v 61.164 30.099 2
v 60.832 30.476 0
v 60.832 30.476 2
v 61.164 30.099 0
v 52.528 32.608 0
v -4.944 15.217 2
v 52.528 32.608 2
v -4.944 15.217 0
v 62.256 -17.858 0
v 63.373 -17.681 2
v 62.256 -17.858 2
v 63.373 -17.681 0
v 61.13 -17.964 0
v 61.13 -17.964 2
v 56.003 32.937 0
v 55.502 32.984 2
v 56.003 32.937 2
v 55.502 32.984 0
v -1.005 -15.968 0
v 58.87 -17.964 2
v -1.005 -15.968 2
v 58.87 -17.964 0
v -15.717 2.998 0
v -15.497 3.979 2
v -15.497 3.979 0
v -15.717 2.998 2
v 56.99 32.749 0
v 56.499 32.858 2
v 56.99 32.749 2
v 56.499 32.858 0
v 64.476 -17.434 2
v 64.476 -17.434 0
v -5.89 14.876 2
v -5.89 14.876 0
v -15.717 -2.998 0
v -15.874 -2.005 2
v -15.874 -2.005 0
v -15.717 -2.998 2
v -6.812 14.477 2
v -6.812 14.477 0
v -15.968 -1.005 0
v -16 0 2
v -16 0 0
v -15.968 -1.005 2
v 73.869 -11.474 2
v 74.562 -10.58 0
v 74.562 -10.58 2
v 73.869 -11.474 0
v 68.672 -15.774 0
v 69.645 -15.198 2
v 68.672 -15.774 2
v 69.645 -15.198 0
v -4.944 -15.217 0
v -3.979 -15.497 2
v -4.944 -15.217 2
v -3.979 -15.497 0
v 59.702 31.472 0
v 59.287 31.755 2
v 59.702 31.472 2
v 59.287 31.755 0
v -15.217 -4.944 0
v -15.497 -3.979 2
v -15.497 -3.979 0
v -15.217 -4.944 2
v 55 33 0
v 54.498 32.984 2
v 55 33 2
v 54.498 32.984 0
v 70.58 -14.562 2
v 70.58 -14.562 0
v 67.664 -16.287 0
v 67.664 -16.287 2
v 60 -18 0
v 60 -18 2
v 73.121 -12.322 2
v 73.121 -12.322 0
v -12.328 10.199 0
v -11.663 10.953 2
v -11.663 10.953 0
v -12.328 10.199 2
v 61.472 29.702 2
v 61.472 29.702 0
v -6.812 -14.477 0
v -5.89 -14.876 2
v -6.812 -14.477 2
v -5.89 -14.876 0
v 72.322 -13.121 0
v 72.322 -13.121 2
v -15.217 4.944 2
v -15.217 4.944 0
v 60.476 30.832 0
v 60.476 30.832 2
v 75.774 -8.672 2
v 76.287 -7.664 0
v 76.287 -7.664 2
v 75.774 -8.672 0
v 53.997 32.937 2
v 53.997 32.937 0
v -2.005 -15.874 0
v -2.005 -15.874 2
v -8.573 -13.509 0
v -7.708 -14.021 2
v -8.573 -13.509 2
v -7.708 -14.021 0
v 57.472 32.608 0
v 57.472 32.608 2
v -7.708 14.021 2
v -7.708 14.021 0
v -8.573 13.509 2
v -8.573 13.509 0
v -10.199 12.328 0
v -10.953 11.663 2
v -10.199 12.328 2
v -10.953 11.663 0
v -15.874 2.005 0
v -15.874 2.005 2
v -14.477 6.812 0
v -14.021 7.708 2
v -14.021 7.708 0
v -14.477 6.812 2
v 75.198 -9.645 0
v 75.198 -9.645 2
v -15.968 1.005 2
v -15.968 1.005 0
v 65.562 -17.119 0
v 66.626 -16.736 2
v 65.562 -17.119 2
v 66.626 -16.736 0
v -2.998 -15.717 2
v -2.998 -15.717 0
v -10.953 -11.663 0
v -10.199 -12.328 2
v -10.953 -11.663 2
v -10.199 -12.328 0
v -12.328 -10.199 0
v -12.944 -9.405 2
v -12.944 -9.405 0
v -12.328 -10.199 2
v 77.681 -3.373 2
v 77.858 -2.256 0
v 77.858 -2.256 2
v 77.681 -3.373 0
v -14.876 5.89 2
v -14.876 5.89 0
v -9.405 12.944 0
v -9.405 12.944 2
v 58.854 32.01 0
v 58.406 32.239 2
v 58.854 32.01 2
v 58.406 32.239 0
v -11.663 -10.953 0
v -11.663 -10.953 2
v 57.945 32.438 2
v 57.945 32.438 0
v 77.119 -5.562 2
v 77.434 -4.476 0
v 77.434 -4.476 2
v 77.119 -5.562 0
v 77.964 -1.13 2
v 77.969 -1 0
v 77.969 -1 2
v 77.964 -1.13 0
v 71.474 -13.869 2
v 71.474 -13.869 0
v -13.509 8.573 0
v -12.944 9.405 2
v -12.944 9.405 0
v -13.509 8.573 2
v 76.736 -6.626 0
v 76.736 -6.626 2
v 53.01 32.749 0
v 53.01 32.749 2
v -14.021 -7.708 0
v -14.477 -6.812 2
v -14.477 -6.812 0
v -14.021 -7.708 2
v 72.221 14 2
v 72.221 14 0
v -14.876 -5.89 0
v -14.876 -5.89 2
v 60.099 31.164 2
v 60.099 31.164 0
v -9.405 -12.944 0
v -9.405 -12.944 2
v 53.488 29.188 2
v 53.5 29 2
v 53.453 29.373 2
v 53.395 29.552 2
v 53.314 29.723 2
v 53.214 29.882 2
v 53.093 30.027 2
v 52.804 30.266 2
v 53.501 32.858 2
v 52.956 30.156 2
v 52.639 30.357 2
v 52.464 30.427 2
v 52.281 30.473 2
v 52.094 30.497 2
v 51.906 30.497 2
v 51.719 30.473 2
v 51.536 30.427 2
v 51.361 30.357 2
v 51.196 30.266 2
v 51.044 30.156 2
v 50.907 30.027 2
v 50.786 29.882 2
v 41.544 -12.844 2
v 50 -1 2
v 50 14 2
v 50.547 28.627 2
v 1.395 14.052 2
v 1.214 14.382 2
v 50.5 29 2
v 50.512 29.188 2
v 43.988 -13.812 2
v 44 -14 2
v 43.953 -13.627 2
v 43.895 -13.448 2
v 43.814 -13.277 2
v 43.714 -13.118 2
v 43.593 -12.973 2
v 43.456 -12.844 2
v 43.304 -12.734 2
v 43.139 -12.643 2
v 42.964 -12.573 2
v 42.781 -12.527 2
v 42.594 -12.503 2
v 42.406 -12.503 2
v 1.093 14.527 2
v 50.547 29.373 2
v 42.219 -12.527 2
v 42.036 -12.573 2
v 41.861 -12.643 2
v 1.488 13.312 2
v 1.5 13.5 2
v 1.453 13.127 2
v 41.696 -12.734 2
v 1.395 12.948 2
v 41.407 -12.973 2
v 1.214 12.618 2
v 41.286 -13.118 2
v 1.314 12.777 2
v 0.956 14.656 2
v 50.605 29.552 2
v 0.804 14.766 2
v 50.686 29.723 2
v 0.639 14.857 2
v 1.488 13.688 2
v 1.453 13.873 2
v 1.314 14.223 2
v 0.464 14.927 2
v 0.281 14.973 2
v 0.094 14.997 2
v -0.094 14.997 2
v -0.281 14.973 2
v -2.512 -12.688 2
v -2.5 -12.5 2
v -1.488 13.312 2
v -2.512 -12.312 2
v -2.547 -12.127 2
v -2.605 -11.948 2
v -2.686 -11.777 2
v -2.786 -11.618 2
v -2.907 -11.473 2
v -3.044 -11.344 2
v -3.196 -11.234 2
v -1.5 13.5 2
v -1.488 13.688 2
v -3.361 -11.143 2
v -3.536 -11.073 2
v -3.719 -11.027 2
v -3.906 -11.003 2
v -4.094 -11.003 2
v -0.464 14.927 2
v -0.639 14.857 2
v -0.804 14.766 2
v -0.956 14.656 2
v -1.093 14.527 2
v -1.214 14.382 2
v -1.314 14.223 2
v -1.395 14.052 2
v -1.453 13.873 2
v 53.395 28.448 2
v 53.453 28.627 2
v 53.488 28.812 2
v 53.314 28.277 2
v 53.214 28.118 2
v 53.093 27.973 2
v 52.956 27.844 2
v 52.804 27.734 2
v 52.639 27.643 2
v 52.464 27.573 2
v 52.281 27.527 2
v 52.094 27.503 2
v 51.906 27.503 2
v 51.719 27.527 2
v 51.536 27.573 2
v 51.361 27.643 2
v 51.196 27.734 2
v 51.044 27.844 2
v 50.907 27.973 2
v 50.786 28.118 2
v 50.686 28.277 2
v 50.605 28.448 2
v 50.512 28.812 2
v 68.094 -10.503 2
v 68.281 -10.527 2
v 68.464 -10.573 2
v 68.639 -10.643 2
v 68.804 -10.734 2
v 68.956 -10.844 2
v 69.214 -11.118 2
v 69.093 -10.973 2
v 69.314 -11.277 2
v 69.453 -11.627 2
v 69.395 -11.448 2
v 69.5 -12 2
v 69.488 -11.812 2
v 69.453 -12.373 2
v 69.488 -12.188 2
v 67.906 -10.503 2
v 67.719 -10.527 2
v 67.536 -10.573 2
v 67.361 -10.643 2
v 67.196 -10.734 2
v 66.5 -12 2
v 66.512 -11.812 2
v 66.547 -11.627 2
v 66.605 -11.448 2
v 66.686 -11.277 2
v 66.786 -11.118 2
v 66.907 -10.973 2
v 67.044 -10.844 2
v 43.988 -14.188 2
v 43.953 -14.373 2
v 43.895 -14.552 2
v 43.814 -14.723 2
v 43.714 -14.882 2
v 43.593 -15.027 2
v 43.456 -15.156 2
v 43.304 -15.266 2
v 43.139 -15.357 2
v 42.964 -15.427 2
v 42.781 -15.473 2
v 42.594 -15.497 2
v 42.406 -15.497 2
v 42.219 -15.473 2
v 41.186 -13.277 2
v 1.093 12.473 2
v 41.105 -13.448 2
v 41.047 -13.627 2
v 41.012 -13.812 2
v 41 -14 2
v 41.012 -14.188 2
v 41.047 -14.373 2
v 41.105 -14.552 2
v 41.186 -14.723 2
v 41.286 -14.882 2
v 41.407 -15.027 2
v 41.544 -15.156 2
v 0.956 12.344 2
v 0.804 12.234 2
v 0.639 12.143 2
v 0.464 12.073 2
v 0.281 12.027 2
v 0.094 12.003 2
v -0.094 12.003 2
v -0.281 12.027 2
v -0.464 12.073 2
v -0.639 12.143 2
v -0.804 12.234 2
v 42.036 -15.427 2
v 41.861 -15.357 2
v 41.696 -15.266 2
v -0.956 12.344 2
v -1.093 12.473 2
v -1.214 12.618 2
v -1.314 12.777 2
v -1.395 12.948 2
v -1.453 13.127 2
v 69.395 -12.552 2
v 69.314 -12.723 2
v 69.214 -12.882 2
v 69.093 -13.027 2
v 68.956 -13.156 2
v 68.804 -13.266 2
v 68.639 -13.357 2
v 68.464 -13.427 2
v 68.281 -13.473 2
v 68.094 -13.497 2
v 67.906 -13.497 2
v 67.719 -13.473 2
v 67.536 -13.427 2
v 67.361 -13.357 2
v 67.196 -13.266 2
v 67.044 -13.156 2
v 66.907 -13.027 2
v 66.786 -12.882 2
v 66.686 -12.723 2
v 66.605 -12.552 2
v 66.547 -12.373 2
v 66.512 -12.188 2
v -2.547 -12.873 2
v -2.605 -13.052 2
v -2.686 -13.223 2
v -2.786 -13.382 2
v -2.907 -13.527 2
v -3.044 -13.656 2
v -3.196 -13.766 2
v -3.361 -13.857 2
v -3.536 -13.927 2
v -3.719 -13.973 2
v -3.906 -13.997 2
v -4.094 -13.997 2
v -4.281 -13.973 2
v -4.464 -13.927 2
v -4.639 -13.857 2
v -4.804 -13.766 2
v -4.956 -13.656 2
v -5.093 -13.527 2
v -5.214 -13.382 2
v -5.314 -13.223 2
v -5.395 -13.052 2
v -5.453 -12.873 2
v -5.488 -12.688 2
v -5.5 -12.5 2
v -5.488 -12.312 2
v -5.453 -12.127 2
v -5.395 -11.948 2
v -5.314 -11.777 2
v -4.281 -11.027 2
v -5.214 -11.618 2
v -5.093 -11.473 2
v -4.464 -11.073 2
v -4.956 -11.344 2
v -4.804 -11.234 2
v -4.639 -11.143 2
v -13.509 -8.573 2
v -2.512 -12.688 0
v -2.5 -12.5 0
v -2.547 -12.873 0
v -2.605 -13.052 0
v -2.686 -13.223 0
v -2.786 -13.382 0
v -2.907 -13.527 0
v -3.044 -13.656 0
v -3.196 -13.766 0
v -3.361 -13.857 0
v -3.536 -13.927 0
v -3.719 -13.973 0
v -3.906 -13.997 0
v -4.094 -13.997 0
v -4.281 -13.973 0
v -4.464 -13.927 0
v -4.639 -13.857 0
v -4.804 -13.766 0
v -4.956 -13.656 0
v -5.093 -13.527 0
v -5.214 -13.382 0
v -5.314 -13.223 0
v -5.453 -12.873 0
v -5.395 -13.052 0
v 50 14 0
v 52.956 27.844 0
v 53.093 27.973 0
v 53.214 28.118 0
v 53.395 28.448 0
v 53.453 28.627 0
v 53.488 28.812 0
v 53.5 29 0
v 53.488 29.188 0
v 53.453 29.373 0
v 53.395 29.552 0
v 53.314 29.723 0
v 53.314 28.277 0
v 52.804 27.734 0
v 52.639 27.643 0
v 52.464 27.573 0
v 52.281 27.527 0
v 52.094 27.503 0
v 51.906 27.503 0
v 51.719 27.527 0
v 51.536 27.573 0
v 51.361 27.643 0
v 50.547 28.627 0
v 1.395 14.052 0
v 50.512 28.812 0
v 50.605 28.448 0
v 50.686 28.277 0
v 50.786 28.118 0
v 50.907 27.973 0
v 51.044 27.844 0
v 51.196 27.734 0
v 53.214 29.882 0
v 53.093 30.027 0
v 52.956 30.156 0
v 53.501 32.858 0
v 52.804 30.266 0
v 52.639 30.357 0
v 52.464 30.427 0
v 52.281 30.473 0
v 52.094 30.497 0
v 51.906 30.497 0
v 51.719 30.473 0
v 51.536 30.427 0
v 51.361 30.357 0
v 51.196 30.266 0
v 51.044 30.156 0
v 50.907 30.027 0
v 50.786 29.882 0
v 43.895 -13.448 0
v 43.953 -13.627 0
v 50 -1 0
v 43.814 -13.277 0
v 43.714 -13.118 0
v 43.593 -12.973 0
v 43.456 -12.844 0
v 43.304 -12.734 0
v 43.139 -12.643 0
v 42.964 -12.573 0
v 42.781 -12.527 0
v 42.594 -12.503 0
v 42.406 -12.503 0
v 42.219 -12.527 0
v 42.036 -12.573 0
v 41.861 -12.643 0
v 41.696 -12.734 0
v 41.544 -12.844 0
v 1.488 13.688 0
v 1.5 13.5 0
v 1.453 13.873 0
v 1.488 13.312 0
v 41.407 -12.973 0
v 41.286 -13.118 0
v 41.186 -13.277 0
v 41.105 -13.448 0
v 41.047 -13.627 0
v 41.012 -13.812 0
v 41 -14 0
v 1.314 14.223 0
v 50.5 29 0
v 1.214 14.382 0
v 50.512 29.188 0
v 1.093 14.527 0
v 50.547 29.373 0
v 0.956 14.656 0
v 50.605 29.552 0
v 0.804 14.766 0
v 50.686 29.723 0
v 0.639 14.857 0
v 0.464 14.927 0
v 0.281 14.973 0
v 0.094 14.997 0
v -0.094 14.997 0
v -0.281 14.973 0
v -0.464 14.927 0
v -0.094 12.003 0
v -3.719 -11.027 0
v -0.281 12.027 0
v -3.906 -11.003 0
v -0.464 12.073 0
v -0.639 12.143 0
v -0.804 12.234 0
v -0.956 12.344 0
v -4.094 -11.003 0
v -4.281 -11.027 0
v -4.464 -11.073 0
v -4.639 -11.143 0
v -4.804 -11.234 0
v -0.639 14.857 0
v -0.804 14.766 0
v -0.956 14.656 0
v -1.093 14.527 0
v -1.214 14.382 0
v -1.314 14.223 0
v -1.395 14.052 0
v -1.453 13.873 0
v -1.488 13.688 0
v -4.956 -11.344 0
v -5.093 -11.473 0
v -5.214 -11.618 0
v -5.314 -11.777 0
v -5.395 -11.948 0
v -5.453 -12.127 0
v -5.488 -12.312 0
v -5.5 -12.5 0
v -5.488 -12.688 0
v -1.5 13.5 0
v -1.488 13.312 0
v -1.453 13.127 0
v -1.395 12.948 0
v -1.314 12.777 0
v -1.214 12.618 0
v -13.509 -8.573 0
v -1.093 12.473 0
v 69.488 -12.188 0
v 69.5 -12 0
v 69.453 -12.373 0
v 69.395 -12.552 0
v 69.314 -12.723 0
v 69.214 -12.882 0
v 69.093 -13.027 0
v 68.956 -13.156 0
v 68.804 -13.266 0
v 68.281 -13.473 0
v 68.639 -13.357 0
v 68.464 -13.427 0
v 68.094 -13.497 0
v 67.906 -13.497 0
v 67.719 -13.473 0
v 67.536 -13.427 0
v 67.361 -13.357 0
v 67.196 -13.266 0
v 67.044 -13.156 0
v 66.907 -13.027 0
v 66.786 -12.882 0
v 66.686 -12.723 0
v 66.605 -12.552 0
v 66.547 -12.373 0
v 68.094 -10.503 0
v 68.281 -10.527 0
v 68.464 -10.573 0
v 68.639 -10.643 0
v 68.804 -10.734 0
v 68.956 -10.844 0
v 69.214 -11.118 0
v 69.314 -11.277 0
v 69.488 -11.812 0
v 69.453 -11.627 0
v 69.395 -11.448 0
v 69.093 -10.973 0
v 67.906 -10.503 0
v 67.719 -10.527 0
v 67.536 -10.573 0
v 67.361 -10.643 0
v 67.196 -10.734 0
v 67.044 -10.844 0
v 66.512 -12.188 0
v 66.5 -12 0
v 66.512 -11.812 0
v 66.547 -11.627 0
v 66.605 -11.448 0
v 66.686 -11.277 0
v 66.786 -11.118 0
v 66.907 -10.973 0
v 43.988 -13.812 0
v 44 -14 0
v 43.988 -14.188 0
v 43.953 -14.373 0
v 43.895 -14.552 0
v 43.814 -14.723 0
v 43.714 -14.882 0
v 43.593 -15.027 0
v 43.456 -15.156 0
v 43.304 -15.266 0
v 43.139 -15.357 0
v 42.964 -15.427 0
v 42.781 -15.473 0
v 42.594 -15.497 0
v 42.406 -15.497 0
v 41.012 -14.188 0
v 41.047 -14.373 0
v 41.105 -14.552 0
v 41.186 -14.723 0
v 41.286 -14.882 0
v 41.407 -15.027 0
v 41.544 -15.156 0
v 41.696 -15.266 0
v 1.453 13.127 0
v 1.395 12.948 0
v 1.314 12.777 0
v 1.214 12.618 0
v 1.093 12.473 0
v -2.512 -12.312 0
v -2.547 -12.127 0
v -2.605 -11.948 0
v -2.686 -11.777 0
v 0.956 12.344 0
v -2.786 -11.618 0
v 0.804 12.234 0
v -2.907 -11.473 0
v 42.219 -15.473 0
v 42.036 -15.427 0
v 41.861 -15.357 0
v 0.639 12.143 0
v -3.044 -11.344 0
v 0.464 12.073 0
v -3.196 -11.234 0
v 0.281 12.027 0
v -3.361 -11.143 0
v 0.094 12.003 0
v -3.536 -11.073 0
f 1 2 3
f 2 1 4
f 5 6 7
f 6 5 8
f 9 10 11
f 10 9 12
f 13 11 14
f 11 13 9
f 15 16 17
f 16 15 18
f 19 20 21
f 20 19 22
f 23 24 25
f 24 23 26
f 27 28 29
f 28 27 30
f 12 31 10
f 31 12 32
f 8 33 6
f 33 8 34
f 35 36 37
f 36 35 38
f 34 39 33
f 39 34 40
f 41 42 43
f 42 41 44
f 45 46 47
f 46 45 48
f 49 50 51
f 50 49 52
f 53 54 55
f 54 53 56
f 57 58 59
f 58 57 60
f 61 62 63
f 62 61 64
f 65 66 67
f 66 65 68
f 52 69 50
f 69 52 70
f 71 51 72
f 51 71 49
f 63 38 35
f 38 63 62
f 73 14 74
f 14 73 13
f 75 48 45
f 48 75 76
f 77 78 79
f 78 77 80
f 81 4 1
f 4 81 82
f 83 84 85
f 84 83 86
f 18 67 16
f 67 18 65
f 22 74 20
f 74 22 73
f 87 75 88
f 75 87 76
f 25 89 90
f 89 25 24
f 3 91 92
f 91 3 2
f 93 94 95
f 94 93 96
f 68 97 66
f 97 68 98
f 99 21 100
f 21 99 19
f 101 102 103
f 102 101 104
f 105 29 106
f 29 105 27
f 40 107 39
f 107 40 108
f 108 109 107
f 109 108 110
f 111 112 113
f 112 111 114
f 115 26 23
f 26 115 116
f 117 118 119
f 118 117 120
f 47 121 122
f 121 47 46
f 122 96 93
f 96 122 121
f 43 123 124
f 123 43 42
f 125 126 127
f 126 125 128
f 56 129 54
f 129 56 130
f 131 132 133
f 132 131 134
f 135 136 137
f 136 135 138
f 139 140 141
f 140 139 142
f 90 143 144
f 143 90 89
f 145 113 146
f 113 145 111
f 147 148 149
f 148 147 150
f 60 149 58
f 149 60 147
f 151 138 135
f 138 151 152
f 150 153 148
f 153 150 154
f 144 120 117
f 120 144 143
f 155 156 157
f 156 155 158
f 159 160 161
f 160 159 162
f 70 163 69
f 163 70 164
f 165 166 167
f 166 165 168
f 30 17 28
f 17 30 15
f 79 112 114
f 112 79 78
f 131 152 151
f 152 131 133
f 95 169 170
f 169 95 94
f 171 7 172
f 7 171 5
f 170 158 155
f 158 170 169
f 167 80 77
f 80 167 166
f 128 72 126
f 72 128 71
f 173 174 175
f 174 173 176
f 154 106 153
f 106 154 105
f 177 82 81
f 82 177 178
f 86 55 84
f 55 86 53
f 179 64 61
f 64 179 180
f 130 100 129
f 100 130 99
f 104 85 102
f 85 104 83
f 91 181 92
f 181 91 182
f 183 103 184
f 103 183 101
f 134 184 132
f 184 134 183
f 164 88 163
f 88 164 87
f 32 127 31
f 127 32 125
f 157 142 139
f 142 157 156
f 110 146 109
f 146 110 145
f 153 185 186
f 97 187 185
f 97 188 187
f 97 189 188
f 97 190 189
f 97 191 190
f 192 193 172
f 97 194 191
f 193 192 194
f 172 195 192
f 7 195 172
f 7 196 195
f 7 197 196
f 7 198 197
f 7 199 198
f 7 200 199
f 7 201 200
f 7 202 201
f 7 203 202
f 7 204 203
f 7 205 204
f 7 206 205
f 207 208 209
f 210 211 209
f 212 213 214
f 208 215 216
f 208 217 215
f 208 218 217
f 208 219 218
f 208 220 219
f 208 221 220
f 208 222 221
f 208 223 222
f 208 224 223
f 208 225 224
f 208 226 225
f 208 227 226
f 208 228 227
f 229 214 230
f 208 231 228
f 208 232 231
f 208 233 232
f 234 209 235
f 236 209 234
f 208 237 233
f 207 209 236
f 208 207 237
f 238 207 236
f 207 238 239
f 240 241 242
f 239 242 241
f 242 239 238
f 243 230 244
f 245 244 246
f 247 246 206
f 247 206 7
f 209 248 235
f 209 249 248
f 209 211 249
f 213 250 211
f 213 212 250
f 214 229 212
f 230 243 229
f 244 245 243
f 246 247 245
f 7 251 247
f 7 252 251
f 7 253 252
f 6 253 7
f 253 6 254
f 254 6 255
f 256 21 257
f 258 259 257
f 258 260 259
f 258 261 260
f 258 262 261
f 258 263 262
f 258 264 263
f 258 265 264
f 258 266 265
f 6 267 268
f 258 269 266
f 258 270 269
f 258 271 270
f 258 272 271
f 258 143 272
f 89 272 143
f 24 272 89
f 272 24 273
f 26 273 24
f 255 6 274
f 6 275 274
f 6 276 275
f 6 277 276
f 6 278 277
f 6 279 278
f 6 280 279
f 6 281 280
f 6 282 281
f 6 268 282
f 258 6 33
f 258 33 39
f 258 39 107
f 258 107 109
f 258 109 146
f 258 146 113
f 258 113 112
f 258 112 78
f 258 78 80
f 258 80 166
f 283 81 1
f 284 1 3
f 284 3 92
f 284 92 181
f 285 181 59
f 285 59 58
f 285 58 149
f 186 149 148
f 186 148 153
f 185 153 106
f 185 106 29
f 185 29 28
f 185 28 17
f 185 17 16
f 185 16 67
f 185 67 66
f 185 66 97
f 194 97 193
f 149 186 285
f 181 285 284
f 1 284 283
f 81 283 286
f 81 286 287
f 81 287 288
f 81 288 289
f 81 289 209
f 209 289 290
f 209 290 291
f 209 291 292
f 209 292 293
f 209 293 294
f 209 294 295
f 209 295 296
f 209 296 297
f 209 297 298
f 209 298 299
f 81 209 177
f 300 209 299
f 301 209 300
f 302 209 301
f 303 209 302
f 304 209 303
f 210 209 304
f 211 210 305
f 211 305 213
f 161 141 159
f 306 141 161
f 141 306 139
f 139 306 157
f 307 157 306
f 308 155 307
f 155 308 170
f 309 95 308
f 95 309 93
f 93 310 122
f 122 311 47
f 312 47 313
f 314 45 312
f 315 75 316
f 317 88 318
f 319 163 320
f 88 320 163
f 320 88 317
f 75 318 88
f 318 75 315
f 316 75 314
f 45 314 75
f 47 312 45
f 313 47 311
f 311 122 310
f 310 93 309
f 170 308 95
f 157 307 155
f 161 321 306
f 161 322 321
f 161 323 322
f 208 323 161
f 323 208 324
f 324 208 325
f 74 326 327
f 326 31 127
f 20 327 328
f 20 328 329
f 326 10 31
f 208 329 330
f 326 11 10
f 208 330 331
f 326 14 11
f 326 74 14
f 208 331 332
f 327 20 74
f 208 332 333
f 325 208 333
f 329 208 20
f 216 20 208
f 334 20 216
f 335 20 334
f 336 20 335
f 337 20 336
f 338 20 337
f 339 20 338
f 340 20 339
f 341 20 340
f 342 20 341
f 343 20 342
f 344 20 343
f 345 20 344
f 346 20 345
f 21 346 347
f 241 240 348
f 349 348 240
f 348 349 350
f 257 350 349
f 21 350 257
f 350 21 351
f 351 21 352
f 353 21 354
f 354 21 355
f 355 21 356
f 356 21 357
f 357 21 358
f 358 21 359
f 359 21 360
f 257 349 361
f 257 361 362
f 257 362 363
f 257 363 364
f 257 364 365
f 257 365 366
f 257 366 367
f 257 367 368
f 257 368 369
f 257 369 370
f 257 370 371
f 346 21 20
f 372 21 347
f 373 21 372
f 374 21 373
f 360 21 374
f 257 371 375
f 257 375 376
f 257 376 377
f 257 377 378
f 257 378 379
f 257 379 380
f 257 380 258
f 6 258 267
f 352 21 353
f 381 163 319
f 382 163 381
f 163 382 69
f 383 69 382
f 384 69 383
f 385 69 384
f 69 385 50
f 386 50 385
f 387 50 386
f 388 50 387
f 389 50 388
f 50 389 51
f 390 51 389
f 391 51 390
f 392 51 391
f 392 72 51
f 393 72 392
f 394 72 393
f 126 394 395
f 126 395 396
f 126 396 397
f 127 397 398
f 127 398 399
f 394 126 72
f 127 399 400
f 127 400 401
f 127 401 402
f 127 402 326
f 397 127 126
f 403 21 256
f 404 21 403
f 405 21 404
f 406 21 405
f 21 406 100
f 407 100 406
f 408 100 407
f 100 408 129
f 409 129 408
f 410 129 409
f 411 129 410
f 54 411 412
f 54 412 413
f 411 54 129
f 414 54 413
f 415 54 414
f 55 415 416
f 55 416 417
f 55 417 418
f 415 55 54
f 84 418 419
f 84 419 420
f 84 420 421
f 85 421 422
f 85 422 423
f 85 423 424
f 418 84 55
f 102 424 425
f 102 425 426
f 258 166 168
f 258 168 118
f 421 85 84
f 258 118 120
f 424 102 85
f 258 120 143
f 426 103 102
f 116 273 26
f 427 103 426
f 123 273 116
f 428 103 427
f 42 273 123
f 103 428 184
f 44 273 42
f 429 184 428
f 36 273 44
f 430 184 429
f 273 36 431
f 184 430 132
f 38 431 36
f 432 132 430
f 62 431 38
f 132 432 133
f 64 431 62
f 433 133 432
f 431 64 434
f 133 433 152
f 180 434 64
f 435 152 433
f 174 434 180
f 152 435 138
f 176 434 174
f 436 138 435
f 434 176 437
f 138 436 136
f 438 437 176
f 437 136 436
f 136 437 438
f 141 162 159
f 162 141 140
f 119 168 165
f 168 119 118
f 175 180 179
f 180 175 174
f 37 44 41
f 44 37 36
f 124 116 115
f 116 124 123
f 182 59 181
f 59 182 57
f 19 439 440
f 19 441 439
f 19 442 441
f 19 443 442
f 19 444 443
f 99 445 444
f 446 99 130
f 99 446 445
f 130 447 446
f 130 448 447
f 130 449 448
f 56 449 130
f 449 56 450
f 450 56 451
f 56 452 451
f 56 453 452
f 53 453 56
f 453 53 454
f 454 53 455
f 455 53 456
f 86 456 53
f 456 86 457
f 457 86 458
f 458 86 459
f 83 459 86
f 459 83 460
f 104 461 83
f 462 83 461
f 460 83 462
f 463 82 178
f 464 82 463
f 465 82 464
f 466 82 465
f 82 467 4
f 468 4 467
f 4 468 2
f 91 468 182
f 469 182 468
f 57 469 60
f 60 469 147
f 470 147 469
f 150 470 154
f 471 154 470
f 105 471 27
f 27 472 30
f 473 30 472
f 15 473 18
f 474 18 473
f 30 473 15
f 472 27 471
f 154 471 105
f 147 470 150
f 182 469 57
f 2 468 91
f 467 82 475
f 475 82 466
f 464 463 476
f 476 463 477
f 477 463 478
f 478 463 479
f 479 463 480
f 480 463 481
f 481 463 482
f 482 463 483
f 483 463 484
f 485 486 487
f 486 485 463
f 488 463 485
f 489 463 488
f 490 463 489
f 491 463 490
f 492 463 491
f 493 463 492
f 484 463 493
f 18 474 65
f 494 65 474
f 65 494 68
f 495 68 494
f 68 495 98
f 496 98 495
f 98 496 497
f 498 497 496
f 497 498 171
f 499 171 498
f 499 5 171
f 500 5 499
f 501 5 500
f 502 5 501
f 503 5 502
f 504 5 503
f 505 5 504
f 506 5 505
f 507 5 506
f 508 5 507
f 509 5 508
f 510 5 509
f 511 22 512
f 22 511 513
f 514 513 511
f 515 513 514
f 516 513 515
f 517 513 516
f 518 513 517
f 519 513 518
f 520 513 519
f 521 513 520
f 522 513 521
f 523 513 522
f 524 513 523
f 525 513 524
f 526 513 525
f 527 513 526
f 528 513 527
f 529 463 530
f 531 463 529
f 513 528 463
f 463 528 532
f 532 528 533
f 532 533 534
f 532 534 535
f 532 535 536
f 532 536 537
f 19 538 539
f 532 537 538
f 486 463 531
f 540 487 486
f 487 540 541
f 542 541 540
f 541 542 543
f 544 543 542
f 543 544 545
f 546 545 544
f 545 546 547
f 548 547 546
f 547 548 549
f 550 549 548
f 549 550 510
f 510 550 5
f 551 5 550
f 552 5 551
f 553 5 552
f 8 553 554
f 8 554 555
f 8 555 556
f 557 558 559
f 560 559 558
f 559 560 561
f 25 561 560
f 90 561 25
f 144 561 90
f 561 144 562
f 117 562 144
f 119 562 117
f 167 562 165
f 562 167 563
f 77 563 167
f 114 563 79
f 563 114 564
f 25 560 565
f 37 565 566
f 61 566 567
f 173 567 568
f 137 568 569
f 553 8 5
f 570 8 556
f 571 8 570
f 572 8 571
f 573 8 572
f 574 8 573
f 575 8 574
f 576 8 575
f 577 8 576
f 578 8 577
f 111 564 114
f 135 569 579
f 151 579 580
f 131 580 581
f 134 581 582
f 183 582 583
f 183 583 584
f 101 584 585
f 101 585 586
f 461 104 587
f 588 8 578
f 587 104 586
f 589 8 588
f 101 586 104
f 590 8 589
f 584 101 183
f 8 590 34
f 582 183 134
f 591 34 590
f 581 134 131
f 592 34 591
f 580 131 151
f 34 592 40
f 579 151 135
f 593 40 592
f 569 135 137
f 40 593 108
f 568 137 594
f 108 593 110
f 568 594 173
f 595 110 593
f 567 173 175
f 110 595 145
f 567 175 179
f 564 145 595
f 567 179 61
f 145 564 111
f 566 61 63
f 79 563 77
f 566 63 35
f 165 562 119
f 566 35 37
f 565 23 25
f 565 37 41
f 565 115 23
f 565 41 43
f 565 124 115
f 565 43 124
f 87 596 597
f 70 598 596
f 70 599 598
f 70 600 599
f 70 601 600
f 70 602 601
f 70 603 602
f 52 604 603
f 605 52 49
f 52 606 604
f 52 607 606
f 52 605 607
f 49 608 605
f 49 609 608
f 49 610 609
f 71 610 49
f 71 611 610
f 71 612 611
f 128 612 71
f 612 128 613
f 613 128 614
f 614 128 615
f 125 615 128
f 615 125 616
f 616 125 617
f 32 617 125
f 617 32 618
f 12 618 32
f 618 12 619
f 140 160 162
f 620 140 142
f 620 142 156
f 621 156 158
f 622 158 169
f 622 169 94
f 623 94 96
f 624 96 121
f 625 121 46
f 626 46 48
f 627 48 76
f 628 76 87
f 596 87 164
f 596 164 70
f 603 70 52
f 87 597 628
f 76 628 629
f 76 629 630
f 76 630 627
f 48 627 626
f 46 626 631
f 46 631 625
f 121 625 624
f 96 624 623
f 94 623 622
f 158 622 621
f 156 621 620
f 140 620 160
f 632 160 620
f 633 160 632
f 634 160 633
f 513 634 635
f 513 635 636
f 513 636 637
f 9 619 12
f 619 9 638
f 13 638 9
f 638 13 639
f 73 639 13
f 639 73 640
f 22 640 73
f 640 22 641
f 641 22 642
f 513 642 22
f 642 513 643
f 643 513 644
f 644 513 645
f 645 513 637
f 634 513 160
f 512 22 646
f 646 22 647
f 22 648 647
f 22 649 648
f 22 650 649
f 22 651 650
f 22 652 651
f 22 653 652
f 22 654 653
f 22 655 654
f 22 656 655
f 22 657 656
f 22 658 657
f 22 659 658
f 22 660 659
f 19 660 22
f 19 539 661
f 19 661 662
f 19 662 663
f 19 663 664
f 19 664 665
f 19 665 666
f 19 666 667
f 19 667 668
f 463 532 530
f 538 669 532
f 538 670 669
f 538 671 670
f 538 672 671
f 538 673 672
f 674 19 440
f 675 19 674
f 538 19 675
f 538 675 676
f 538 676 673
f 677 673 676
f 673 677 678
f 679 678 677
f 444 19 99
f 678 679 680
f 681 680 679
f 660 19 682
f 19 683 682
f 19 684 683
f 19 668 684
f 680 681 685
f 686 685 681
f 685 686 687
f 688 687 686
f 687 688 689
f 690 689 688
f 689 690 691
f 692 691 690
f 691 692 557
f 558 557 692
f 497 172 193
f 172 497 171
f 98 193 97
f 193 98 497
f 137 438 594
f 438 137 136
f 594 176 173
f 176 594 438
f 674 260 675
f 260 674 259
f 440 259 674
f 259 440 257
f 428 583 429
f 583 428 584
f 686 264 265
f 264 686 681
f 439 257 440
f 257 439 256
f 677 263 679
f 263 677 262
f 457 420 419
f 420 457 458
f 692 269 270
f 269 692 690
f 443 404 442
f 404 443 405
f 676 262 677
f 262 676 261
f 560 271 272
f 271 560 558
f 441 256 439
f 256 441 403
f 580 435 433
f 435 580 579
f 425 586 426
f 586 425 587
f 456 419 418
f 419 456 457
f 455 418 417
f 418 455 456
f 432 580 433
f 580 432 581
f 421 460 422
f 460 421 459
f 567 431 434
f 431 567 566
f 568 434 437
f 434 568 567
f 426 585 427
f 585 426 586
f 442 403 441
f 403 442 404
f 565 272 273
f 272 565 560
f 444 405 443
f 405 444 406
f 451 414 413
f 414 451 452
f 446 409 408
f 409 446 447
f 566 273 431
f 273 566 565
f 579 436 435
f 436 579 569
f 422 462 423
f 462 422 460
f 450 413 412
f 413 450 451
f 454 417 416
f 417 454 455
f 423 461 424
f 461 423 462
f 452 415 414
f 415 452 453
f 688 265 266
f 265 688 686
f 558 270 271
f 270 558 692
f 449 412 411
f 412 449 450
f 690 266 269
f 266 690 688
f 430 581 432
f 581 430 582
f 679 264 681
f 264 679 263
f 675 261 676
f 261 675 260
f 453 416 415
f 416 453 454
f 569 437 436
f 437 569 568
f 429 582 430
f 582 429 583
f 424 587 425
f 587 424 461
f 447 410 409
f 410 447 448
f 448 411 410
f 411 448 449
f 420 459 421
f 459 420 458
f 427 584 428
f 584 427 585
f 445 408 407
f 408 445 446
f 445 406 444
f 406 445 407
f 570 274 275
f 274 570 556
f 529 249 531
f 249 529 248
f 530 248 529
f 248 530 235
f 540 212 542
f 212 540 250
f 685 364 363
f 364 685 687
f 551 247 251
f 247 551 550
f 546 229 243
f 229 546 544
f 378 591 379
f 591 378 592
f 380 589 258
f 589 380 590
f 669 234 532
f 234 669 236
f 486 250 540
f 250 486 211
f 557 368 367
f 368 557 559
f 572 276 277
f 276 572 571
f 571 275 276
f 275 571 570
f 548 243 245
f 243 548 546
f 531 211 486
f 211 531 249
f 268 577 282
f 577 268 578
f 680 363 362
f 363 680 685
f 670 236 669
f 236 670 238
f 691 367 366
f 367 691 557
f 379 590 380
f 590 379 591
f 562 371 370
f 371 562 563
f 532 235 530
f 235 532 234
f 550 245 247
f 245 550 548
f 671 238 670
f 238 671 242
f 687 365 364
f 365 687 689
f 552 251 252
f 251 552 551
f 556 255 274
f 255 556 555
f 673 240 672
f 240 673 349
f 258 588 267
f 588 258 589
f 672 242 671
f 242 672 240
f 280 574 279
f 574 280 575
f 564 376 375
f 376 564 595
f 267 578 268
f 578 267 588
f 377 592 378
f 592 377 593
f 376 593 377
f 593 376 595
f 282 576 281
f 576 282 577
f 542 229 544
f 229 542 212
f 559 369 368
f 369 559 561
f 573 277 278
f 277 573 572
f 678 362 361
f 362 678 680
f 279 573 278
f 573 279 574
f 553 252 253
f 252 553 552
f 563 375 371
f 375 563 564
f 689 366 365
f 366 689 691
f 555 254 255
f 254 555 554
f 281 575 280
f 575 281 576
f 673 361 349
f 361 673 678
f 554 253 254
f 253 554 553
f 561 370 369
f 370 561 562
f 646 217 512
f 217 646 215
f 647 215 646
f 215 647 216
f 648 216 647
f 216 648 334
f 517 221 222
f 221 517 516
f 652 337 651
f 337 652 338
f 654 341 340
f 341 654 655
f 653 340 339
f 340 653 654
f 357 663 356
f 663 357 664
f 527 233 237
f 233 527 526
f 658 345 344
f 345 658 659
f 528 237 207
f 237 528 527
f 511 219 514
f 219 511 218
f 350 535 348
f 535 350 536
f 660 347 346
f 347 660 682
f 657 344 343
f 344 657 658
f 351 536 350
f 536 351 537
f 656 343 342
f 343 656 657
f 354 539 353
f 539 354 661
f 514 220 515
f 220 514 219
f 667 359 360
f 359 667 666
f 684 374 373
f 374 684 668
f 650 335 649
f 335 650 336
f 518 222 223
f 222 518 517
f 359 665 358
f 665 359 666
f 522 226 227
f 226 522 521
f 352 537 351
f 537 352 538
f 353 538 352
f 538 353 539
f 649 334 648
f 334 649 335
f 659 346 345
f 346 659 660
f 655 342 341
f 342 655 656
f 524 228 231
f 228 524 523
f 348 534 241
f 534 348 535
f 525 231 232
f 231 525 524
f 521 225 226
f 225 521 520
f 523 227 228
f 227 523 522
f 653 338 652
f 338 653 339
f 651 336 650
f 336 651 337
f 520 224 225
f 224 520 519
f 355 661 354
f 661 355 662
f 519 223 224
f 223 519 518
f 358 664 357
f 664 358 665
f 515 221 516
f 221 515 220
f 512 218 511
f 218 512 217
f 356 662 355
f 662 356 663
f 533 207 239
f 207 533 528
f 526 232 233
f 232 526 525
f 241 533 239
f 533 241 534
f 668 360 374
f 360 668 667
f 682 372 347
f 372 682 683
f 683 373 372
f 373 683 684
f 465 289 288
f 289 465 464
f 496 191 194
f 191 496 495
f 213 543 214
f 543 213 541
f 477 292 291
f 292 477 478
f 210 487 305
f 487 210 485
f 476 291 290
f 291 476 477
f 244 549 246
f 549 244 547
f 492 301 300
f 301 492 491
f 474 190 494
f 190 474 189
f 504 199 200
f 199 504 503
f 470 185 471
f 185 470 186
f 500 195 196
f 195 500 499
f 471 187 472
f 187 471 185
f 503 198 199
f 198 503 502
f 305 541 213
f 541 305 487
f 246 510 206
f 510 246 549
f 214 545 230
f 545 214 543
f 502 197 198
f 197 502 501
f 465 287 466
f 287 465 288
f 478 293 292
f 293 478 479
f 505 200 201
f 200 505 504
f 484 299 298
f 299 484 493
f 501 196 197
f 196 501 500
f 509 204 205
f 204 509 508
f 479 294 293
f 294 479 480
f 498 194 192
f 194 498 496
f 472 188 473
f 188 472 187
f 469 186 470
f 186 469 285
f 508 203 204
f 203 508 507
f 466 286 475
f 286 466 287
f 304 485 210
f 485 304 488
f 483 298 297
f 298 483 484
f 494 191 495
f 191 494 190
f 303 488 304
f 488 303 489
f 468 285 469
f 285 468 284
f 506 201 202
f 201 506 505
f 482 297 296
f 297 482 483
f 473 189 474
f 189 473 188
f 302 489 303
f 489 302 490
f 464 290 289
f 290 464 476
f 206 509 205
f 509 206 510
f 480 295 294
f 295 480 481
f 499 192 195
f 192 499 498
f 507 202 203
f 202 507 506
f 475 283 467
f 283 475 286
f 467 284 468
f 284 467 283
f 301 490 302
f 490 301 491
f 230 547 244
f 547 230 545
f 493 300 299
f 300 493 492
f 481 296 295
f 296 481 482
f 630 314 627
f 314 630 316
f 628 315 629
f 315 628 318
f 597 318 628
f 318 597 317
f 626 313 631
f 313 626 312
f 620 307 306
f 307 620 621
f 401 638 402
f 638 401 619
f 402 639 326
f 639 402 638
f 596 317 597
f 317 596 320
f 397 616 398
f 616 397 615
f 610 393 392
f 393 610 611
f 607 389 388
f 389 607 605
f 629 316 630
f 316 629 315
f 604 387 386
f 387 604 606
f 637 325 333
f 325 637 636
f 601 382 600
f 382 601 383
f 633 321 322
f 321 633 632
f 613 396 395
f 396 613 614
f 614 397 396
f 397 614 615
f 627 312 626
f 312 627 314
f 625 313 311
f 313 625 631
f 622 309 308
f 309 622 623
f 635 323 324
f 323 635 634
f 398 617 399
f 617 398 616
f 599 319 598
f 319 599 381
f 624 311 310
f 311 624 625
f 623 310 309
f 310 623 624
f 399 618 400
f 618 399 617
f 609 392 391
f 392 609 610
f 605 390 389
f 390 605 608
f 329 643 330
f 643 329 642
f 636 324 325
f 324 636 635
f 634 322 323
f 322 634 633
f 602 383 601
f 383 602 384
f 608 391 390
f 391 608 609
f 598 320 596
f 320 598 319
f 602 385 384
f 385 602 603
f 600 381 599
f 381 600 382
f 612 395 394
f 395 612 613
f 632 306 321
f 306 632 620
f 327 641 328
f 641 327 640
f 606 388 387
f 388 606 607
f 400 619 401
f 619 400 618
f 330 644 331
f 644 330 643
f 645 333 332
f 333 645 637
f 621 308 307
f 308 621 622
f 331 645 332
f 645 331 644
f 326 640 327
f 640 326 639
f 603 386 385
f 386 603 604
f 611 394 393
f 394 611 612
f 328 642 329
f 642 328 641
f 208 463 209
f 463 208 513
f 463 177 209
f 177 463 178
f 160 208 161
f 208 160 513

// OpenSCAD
r_ext=16;
ep=2;
hauteur=103;
r_vis=1.4;

module boitier(){
	difference(){
		hull(){
			cylinder(h = hauteur, r = r_ext, $fn=100);
			translate([60,0,0]){cylinder(h = hauteur, r = r_ext+2, $fn=100);}
			translate([55,25,0]){cylinder(h = hauteur, r = 8, $fn=100);}
		}

		//évidement intérieur général
		hull(){
			translate([0,0,-2])cylinder(h = hauteur+5, r = r_ext-ep, $fn=100);
			translate([60,0,-2]){cylinder(h = hauteur+5, r = r_ext+2-ep, $fn=100);}
			translate([55,25,-2]){cylinder(h = hauteur+5, r = 6, $fn=100);}
		}
		//ouvertures pour écran
		translate([7,-r_ext-5,12.5]){cube([26,10,78]);}

		//trous pour visser carte
		translate([-8,-r_ext-5,5]){rotate([-90,0,0])cylinder(h = 15, r = 2, $fn=50);}
		translate([-8,-r_ext-5,hauteur-5]){rotate([-90,0,0])cylinder(h = 15, r = 2, $fn=50);}

		//trou pour encodeur
		translate([59,-r_ext-5,63]){rotate([-90,0,0])cylinder(h = 15, r = 5, $fn=50);}
		
		
	}

	//ajout pour vissage des flancs
	difference(){
		union(){
			translate([-4,-r_ext+3.5,0])cylinder(h = hauteur, r = 2.5, $fn=50);
			translate([0,r_ext-2.5,0])cylinder(h = hauteur, r = 2.5, $fn=50);
			translate([42.5,-r_ext+2,0])cylinder(h = hauteur, r = 2.5, $fn=50);
			translate([52,29,0])cylinder(h = hauteur, r = 2.5, $fn=50);
			translate([68,-r_ext+4,0])cylinder(h = hauteur, r = 2.5, $fn=50);
		}

		translate([-4,-r_ext+3.5,-2])cylinder(h = hauteur+10, r = r_vis, $fn=50);
		translate([0,r_ext-2.5,-2])cylinder(h = hauteur+10, r = r_vis, $fn=50);
		translate([42.5,-r_ext+2,-2])cylinder(h = hauteur+10, r = r_vis, $fn=50);
		translate([52,29,-2])cylinder(h = hauteur+10, r = r_vis, $fn=50);
		translate([68,-r_ext+4,-2])cylinder(h = hauteur+10, r = r_vis, $fn=50);
	}
	

}

module capot(){
	difference(){

	hull(){
			cylinder(h = ep, r = r_ext, $fn=100);
			translate([60,0,0]){cylinder(h = ep, r = r_ext+2, $fn=100);}
			translate([55,25,0]){cylinder(h = ep, r = 8, $fn=100);}
		}

	translate([-4,-r_ext+3.5,-2])cylinder(h = hauteur+10, r = 1.5, $fn=50);
	translate([0,r_ext-2.5,-2])cylinder(h = hauteur+10, r = 1.5, $fn=50);
	translate([42.5,-r_ext+2,-2])cylinder(h = hauteur+10, r = 1.5, $fn=50);
	translate([52,29,-2])cylinder(h = hauteur+10, r = 1.5, $fn=50);
	translate([68,-r_ext+4,-2])cylinder(h = hauteur, r = 1.5, $fn=50);

	//trou pour carte SD
	translate([50,-1,-2]){cube([30,15,5]);}

	}
}

//boitier();
capot();
//translate([0,0,-ep])capot();
